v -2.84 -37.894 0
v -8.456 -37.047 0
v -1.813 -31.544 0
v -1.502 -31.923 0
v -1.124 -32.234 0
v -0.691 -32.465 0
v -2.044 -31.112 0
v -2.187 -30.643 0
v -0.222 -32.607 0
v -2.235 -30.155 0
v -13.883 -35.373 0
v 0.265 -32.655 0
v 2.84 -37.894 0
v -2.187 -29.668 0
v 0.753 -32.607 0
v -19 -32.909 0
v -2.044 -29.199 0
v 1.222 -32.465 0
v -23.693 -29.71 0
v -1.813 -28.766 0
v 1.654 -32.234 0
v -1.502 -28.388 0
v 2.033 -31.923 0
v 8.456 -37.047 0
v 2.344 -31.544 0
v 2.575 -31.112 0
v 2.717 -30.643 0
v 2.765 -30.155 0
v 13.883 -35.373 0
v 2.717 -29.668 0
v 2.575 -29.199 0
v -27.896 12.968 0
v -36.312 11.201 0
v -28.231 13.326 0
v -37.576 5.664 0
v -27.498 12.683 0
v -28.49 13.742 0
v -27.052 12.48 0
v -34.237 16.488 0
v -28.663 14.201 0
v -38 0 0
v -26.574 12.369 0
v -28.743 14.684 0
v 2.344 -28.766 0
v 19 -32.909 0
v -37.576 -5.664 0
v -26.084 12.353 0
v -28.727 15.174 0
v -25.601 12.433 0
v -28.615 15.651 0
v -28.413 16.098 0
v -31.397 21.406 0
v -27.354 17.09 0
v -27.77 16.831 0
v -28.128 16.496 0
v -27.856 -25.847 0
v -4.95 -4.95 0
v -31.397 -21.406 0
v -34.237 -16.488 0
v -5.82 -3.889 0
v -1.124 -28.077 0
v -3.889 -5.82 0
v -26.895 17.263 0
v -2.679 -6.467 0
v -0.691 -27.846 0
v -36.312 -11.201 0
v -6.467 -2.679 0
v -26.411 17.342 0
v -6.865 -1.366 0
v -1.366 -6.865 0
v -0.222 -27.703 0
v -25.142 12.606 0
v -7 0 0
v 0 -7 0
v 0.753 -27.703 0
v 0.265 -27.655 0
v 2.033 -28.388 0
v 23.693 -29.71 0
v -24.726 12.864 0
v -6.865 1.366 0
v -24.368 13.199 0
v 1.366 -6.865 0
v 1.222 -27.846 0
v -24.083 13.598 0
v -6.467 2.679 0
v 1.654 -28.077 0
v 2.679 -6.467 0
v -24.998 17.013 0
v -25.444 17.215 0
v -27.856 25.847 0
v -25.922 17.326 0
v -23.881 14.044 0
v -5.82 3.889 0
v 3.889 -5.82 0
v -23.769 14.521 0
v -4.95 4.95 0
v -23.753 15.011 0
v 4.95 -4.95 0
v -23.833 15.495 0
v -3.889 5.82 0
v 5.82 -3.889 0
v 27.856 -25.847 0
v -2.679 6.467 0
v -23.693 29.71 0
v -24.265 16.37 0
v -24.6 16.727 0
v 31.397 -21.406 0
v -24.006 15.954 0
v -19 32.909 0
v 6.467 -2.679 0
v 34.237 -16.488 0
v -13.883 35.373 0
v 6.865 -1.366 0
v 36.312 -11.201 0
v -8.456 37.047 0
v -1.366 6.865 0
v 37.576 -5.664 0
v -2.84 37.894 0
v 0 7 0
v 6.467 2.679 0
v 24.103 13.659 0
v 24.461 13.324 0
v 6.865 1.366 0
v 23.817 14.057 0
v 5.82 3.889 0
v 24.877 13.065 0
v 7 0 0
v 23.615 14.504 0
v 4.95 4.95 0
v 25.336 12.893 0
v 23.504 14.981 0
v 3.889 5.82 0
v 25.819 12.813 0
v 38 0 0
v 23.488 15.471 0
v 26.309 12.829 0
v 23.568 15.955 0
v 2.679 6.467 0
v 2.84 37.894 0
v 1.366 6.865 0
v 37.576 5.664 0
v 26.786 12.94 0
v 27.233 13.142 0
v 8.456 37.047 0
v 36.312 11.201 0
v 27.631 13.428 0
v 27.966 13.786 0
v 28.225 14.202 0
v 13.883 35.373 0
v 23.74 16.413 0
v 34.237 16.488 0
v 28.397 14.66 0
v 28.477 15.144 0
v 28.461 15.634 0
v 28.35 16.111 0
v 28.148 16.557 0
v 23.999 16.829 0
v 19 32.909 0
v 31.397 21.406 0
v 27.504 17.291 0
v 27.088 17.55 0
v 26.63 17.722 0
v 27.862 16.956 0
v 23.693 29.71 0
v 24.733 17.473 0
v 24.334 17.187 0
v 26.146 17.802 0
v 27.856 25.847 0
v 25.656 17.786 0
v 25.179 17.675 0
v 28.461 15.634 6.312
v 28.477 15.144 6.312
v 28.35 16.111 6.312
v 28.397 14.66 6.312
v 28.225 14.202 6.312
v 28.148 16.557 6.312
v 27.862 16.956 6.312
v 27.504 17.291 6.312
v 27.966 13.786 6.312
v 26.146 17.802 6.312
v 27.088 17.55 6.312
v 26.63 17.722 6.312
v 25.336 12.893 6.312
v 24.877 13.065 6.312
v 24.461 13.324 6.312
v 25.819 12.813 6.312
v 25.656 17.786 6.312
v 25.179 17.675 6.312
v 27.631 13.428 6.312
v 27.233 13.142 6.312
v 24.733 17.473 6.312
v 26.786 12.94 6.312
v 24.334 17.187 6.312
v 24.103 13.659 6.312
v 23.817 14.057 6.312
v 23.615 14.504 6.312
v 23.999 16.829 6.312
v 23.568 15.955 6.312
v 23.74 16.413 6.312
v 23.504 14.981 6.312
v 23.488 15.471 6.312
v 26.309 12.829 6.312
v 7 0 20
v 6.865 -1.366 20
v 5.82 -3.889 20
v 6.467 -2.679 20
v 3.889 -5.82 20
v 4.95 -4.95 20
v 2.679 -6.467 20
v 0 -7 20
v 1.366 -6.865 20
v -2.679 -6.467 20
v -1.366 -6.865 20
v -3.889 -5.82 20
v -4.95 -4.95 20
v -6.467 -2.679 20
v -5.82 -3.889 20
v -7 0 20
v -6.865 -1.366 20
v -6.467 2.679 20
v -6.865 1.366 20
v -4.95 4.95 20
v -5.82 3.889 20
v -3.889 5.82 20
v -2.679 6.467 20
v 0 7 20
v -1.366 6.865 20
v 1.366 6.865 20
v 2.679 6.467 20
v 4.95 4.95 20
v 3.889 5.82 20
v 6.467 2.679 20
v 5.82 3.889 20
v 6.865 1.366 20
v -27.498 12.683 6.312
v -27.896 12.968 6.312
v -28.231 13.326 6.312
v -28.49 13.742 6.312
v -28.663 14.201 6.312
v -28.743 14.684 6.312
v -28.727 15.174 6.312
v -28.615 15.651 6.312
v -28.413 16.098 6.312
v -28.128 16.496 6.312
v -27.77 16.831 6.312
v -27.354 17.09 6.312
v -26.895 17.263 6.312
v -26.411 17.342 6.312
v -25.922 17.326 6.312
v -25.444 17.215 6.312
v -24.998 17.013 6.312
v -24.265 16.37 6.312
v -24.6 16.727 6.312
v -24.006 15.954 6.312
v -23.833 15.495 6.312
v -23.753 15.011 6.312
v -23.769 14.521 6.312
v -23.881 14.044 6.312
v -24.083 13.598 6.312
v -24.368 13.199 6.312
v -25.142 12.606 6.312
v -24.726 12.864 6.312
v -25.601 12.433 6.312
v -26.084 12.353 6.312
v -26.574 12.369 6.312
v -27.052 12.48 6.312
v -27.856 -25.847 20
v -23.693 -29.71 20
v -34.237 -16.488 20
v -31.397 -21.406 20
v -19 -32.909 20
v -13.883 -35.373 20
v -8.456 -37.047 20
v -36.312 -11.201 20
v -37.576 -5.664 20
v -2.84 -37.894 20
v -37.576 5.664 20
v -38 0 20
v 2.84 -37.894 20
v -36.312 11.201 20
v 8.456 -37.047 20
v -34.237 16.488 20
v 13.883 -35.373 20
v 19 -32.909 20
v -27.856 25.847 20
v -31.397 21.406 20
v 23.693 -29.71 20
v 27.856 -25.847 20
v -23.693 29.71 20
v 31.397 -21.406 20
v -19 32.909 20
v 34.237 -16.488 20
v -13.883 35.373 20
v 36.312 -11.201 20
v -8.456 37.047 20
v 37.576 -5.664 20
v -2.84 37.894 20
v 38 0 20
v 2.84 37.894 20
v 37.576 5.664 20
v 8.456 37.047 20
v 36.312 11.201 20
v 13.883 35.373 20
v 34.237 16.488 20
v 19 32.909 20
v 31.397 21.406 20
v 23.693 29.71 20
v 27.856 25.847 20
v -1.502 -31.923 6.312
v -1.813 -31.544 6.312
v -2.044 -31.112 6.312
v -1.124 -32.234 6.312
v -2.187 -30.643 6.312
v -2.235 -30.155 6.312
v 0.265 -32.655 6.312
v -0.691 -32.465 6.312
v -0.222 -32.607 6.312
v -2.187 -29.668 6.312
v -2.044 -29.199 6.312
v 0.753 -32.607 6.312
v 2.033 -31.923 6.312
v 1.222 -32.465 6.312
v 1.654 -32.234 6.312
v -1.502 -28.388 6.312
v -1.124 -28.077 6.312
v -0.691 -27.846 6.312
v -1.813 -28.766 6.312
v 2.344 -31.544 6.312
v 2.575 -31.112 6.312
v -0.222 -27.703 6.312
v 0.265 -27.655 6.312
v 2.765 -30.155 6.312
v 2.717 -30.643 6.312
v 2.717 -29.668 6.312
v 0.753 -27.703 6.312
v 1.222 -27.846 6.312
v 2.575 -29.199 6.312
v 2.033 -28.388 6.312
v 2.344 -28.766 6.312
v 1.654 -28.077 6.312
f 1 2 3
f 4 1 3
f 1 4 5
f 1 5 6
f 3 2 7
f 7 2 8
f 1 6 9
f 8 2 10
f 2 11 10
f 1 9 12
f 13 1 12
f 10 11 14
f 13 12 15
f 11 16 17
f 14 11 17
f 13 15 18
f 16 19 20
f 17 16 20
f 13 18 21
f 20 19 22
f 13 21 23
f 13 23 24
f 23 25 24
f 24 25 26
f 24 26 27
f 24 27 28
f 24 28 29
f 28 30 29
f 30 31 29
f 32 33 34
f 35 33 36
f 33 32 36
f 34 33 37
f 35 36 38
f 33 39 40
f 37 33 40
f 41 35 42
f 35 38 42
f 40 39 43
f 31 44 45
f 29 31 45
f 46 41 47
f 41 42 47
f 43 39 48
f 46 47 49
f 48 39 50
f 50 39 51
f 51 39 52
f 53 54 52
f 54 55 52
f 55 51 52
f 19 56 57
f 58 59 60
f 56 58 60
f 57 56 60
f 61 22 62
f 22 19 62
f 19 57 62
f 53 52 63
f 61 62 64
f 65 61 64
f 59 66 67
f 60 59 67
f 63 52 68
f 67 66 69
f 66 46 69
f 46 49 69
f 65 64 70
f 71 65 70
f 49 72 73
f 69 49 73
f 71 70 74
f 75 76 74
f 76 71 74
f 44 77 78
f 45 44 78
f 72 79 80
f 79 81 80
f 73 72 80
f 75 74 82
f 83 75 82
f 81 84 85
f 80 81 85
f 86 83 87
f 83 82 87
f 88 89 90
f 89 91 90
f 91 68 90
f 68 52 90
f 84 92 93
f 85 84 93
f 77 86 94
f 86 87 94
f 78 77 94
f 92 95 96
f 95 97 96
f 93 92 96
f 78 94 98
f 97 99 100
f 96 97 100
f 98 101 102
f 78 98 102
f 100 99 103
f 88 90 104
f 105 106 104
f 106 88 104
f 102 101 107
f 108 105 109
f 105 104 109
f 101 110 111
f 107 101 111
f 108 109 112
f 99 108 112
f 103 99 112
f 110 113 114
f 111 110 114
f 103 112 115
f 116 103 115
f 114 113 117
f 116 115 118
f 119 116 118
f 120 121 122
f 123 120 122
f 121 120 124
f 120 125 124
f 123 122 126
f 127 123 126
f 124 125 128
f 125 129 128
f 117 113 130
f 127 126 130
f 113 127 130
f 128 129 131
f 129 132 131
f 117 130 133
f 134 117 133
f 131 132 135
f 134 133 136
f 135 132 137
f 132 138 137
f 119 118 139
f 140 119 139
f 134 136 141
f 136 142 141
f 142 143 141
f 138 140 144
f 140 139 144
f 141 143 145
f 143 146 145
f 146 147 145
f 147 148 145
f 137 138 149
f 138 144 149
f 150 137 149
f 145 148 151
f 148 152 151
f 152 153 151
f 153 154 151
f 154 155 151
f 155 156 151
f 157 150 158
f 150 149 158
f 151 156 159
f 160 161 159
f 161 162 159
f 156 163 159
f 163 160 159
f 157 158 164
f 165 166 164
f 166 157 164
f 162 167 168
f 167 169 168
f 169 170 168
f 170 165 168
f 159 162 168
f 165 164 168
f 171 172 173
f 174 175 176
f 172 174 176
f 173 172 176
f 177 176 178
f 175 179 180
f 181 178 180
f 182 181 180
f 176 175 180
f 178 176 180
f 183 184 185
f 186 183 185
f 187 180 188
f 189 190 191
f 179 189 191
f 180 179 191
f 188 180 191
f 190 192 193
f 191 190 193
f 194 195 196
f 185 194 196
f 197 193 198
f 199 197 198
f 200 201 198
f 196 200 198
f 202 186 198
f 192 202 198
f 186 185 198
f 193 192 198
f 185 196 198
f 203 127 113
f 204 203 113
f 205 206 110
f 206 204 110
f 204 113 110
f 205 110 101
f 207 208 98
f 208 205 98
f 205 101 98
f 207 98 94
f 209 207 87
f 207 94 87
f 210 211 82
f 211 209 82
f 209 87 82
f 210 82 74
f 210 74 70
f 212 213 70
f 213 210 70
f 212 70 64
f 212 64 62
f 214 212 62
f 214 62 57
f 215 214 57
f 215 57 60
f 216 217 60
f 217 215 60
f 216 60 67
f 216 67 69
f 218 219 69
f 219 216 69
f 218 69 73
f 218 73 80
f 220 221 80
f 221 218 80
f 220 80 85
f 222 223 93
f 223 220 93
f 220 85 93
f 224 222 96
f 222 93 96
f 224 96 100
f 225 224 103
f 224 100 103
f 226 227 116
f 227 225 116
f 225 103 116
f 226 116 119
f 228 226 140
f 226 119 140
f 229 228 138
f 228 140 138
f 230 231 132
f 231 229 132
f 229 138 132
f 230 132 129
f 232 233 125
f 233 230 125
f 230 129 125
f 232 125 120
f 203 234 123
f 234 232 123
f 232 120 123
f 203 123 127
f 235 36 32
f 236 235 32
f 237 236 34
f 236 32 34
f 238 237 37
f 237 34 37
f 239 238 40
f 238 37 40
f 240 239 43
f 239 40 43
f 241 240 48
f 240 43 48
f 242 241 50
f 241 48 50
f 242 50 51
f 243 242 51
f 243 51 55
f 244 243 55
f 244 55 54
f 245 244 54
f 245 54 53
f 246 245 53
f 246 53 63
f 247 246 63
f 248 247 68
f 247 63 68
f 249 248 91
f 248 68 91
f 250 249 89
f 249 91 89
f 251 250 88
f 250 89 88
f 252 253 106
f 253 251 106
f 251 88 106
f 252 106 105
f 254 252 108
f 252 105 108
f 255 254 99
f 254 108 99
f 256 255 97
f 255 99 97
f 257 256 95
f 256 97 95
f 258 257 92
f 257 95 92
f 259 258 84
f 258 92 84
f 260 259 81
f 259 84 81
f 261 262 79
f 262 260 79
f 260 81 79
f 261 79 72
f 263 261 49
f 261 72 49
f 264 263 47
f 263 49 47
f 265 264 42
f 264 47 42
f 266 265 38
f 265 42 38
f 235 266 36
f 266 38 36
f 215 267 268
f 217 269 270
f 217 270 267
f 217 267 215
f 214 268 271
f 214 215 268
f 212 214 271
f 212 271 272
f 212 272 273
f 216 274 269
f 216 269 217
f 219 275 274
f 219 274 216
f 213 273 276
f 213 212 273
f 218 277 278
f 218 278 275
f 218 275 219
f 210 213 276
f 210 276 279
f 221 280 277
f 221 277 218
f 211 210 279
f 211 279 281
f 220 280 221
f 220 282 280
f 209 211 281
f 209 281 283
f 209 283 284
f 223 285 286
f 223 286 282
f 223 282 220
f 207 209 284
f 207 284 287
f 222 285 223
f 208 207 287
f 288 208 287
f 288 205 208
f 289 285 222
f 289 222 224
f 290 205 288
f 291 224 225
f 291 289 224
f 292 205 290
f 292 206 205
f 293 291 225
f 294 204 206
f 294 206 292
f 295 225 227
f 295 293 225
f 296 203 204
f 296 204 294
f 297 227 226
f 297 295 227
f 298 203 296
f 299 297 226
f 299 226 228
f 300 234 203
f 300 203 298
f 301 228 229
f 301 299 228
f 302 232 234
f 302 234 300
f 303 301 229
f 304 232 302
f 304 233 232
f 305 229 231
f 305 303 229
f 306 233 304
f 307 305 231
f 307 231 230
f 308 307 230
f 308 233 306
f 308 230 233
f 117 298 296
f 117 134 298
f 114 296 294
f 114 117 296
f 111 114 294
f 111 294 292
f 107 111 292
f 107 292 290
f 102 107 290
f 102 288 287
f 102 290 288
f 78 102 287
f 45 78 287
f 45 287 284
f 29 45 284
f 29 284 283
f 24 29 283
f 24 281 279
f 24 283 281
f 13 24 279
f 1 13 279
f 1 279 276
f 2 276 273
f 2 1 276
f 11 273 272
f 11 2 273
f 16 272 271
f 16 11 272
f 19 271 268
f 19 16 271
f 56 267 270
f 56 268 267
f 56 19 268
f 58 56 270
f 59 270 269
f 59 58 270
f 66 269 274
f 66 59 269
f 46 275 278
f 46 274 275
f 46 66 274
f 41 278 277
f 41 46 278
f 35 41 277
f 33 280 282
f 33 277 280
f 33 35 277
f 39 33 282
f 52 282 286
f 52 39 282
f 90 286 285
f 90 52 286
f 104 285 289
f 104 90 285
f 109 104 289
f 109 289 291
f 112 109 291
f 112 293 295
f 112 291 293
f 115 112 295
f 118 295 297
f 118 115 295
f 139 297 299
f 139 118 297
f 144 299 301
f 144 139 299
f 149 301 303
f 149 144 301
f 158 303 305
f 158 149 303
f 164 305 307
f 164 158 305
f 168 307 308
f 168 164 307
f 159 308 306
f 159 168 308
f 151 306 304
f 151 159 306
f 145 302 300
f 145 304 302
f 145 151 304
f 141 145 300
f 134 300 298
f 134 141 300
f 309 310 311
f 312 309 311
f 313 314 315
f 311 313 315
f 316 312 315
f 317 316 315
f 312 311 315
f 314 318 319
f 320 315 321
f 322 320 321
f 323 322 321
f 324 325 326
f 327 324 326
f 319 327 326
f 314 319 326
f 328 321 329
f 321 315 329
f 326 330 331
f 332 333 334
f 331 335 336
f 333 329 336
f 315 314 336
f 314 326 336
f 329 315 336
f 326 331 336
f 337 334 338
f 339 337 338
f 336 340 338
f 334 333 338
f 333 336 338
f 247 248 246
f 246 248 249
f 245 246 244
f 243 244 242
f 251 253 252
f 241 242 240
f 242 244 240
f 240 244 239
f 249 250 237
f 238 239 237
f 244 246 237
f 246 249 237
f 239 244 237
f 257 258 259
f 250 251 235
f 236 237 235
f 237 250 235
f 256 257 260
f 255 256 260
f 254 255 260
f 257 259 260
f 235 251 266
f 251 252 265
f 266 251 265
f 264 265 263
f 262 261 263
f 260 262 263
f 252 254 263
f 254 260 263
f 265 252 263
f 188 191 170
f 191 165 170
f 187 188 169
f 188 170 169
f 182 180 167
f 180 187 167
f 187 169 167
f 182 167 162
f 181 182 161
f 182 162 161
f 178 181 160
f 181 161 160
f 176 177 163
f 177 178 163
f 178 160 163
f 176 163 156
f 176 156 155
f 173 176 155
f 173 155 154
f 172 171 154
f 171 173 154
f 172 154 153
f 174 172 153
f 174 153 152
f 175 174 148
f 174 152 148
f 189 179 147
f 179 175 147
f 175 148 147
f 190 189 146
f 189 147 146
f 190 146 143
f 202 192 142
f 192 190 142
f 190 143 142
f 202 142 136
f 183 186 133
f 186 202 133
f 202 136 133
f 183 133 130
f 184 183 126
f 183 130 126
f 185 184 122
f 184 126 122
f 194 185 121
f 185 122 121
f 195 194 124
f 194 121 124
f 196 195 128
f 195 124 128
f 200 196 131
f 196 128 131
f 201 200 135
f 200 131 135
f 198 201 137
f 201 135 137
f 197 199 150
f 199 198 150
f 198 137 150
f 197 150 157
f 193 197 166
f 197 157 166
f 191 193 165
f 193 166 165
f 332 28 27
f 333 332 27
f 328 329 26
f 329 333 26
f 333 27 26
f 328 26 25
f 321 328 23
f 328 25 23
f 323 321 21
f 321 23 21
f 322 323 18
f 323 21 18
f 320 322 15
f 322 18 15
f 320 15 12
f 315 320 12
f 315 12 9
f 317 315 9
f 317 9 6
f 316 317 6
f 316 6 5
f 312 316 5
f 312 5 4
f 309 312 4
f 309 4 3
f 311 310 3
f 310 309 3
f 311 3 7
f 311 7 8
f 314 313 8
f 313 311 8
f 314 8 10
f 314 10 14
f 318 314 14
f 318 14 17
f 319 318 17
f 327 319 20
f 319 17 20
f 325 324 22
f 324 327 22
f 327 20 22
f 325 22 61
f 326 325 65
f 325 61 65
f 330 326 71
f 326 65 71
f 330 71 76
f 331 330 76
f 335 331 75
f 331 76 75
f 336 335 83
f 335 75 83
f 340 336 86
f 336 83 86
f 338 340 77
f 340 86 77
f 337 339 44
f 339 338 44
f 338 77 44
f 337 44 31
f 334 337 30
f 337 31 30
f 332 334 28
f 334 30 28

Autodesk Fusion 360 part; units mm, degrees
sketch "Sketch1" plane through (0, 0, 0) normal (0, 0, 1) x (1, 0, 0)
  circle A0 centre (0, 0) radius 7
  circle A1 centre (0, 0) radius 22.5
  circle A2 centre (0, 0) radius 38
  dimension "d1" = 45
  dimension "d2" = 14
  dimension "d3" = 76
extrude "Extrude1" add sketch "Sketch1" along normal blind 20 contours A1
sketch "Sketch2" plane through (0, 0, 0) normal (0, 0, 1) x (1, 0, 0)
  circle A0 centre (0.2654, -30.1553) radius 2.5
  dimension "d8" = 5
extrude "Extrude4" add sketch "Sketch1" along normal blind 20 contours A1 | A2
extrude "Extrude5" cut sketch "Sketch2" along normal blind 6.312
pattern_circular "C-Pattern2" count 3 over 360 about axis through (0, 0, 20) along (0, 0, 1) of "Extrude5"
